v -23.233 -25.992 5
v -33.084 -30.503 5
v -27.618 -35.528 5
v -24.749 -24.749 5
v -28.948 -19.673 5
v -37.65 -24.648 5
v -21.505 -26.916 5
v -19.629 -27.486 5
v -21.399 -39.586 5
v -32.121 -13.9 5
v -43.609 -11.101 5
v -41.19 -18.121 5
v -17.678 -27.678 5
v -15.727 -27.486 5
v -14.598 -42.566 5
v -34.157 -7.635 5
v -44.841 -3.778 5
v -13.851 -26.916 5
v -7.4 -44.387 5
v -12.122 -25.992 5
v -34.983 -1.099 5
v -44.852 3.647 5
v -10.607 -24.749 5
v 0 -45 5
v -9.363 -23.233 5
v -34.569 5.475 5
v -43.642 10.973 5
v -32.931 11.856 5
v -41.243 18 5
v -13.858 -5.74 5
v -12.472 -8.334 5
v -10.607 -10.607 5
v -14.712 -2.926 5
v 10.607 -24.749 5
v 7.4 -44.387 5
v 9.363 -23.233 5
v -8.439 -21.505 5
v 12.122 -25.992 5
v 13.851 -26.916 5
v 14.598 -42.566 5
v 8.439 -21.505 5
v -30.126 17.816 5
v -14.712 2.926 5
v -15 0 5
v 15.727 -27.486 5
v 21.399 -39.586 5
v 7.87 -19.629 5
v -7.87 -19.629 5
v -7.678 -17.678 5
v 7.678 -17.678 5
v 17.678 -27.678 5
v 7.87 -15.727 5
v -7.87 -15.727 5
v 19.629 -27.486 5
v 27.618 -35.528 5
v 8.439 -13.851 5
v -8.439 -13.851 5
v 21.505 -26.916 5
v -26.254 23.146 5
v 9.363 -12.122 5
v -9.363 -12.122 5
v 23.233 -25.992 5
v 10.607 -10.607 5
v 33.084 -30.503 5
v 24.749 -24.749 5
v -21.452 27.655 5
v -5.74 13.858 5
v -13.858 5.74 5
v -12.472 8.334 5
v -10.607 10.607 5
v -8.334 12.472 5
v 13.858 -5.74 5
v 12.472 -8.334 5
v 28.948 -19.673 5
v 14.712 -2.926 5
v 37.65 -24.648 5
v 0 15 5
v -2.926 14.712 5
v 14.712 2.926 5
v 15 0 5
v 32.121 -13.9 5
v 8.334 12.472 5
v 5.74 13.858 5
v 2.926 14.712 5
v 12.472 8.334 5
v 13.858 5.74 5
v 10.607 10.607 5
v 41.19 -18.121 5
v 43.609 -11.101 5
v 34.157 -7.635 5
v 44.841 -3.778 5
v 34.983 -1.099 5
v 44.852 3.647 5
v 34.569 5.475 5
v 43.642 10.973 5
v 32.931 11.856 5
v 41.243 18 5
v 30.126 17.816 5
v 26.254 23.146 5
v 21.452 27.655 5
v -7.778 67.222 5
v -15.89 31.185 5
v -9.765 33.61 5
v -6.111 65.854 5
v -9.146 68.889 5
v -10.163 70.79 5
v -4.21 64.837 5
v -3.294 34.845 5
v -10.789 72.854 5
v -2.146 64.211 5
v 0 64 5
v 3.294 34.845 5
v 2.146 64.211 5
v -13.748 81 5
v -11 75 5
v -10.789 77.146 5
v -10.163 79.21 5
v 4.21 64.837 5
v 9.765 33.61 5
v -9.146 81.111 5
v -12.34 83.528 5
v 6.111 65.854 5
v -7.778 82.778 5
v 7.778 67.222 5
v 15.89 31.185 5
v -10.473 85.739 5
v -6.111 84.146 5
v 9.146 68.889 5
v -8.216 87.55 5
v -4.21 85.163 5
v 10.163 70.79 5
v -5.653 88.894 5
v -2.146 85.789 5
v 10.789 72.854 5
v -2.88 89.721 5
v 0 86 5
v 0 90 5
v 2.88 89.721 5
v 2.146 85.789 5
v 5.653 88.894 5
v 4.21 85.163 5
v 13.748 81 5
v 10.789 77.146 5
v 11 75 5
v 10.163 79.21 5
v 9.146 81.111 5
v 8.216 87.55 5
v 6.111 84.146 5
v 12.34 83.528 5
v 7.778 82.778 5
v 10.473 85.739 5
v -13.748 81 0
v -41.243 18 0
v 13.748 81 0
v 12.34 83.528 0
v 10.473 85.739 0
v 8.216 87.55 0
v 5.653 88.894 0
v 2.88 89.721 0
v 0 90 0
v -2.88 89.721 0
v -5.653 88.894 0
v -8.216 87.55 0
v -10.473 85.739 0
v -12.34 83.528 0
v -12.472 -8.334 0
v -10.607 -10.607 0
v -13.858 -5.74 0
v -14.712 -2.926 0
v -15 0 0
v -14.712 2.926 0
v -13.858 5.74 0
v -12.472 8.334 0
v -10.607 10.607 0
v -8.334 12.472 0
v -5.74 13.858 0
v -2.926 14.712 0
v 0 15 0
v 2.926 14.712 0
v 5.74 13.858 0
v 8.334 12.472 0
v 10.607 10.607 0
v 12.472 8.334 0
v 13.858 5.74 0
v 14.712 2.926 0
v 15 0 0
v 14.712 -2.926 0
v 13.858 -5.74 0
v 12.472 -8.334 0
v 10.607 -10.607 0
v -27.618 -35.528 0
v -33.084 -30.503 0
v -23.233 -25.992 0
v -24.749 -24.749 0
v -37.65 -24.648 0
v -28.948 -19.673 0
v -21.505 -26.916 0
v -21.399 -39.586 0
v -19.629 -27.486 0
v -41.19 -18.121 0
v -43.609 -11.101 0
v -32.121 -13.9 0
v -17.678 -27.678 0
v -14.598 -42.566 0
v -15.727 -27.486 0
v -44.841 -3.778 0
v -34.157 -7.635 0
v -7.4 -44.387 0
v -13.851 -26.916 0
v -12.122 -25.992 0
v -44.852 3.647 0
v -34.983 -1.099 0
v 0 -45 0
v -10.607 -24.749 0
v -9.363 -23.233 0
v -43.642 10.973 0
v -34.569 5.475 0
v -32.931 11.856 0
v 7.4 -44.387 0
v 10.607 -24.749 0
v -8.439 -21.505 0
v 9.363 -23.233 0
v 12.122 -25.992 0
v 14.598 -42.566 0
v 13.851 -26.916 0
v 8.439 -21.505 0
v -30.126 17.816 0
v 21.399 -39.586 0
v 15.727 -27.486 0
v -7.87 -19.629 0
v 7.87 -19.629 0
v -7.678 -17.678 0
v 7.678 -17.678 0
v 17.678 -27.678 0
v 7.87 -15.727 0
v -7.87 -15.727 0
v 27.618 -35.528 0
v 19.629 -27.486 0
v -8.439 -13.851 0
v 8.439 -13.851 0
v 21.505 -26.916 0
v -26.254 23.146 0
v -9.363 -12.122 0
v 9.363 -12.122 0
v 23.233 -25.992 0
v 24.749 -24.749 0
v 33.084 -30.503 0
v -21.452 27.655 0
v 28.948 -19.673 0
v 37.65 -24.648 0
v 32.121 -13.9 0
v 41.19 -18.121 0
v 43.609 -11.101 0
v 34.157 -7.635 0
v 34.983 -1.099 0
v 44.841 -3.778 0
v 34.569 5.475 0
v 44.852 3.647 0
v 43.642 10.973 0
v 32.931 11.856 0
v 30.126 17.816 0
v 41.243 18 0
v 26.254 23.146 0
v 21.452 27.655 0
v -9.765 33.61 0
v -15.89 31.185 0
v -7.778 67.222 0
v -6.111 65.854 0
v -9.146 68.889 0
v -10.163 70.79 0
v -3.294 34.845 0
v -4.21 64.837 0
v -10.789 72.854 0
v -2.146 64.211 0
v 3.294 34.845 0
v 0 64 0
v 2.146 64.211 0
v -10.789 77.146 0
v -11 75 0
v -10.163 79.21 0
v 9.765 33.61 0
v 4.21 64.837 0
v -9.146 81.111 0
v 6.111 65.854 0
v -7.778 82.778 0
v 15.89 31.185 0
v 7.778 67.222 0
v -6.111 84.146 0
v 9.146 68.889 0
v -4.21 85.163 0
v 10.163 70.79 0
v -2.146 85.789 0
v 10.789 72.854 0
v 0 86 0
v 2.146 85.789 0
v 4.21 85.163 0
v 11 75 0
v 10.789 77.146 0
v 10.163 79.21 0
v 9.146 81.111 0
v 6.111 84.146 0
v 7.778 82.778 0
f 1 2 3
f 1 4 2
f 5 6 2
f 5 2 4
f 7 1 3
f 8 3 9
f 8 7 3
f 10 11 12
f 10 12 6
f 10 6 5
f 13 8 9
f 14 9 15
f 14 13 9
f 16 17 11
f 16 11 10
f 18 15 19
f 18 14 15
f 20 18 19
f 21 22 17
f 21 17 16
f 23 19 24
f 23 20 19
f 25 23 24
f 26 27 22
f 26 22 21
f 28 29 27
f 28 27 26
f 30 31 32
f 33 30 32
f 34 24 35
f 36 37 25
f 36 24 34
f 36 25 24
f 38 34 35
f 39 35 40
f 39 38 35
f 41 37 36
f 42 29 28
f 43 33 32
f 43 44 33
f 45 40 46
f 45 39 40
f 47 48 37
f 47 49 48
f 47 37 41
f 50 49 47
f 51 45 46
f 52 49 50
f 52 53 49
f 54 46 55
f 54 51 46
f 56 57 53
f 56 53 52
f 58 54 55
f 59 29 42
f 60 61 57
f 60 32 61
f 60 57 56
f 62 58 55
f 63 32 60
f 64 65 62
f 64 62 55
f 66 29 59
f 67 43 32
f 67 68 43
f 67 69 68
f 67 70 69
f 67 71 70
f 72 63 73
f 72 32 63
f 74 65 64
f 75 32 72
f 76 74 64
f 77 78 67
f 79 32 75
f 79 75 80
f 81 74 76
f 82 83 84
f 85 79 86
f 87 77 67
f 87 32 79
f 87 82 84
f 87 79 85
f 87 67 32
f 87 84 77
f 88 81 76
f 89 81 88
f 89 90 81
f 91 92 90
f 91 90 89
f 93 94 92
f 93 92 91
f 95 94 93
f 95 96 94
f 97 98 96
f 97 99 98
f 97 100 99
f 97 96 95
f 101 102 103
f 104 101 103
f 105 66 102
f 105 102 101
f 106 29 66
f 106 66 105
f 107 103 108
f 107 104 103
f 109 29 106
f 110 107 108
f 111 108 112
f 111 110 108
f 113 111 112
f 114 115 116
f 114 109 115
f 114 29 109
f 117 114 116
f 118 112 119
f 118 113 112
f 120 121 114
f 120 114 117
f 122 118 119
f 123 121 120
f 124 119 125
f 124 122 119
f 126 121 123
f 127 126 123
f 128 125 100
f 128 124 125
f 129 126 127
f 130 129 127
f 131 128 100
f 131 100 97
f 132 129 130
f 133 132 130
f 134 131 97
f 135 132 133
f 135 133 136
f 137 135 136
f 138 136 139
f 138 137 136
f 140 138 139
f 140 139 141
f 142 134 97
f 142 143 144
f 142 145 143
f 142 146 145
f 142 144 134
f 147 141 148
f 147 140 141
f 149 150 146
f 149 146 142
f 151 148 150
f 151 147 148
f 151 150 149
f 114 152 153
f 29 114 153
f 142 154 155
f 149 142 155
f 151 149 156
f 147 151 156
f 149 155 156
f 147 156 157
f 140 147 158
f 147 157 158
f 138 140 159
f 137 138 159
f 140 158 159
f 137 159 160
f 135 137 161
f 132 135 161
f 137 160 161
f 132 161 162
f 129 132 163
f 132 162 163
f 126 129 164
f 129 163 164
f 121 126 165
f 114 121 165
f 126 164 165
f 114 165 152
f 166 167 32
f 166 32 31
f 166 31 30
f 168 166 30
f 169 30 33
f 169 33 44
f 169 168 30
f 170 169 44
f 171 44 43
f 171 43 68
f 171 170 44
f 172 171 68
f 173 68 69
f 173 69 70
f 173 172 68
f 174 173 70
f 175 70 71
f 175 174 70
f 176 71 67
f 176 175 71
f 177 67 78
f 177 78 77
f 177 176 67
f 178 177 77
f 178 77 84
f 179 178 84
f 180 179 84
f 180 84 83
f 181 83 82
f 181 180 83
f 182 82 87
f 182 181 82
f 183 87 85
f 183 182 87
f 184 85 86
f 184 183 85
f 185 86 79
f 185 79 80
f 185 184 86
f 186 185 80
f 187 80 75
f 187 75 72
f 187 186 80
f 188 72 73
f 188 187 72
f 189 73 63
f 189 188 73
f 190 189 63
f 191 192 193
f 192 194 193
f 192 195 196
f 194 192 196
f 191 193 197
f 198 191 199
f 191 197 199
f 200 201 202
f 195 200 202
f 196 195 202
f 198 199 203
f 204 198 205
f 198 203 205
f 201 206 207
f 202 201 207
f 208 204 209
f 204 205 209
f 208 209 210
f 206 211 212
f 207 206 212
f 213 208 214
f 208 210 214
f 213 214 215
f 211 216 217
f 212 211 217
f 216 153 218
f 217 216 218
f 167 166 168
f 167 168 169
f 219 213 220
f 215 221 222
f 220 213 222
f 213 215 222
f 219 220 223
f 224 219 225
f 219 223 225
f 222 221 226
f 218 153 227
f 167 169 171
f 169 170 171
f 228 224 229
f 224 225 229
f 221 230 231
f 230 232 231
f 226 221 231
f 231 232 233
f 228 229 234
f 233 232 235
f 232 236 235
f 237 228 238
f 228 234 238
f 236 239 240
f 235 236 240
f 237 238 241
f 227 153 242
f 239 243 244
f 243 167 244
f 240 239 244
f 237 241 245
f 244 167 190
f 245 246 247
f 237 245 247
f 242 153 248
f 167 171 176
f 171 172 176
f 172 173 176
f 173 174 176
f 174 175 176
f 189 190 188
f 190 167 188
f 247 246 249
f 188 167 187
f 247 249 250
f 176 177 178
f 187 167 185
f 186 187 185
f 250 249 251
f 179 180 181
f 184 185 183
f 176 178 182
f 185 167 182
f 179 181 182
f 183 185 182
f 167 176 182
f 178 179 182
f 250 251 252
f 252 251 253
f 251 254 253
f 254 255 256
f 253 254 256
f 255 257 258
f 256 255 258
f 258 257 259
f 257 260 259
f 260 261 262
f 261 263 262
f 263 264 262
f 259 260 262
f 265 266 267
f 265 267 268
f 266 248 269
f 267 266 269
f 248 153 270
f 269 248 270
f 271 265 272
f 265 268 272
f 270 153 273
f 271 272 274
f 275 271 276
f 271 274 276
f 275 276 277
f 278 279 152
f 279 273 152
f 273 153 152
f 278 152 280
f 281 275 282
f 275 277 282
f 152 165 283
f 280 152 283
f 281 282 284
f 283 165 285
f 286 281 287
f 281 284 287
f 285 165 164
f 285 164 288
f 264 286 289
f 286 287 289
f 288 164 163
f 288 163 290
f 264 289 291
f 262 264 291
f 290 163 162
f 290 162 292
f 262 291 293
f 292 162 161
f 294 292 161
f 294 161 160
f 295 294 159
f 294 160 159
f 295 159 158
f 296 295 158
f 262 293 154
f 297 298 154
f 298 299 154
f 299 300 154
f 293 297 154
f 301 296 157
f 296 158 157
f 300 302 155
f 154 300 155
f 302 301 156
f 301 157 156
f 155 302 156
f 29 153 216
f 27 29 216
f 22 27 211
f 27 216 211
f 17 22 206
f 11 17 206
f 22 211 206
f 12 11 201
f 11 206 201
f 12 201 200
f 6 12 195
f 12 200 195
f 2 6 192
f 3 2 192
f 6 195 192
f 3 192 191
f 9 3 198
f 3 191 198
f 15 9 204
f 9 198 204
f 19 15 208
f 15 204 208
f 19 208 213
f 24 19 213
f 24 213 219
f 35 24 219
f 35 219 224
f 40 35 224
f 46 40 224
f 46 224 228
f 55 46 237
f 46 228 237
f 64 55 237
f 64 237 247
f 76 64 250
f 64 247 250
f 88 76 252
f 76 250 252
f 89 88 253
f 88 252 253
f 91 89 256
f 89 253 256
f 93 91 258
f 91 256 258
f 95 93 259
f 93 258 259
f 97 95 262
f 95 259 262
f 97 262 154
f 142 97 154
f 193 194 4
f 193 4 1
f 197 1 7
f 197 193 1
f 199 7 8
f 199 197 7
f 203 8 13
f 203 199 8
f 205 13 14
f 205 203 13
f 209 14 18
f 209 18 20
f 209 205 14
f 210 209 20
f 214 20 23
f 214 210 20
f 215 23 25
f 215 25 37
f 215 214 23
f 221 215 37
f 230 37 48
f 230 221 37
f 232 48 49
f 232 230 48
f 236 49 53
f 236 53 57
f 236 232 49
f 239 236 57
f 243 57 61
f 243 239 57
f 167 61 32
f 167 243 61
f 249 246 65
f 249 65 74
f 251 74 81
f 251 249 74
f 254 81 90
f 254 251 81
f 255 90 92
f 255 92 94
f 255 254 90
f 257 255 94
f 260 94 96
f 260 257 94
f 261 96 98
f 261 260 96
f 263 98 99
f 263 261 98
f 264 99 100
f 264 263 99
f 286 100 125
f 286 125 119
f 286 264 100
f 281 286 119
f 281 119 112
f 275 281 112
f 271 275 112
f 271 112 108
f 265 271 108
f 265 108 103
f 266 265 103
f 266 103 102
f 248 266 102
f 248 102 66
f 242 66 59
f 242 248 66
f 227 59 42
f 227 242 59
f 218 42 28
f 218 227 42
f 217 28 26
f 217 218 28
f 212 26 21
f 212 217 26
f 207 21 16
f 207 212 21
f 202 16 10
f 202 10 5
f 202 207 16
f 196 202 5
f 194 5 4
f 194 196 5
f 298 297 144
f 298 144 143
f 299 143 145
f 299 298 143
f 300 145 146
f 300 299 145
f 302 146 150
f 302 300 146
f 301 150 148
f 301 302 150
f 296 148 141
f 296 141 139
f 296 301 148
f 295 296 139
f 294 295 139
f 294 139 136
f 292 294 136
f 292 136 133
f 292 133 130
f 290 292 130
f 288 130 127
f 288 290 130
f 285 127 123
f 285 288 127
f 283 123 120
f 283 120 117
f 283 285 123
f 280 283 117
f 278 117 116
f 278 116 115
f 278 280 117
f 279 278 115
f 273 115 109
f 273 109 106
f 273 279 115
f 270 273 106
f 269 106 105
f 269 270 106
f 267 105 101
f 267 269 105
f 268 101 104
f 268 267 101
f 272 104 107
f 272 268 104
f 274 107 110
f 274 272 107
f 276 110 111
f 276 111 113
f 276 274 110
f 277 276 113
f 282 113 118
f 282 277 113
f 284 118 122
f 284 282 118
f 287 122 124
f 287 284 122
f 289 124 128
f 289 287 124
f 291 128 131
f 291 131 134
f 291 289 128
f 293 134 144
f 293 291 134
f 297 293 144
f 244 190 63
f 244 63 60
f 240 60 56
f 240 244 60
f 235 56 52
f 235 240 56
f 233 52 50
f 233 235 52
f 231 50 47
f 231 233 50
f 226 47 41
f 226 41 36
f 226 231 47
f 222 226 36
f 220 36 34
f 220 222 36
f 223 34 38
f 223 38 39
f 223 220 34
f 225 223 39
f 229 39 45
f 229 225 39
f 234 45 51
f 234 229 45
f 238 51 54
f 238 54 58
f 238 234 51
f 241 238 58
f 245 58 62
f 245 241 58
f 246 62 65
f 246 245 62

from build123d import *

# Parameters (mm, degrees)
CROQUIS1_R              = 11
SALIENTE_EXTRUIR1_DEPTH = 5


with BuildPart() as part:
    # Croquis1 → Saliente-Extruir1 (new body)
    with BuildSketch(Plane.XY):
        with BuildLine():
            Line((-13.747727085, 81), (-41.243181255, 18))
            ThreePointArc((-41.243181255, 18), (0, -45), (41.243181255, 18))
            Line((41.243181255, 18), (13.747727085, 81))
            ThreePointArc((13.747727085, 81), (0, 90), (-13.747727085, 81))
        make_face()
        with Locations((0, 75)):
            Circle(CROQUIS1_R, mode=Mode.SUBTRACT)
        with BuildLine():
            ThreePointArc((24.748737342, -24.748737342), (0, 35), (-24.748737342, -24.748737342))
            ThreePointArc((-24.748737342, -24.748737342), (-10.606601718, -24.748737342), (-10.606601718, -10.606601718))
            ThreePointArc((-10.606601718, -10.606601718), (0, 15), (10.606601718, -10.606601718))
            ThreePointArc((10.606601718, -10.606601718), (10.606601718, -24.748737342), (24.748737342, -24.748737342))
        make_face(mode=Mode.SUBTRACT)
    extrude(amount=SALIENTE_EXTRUIR1_DEPTH)


solid = part.part
